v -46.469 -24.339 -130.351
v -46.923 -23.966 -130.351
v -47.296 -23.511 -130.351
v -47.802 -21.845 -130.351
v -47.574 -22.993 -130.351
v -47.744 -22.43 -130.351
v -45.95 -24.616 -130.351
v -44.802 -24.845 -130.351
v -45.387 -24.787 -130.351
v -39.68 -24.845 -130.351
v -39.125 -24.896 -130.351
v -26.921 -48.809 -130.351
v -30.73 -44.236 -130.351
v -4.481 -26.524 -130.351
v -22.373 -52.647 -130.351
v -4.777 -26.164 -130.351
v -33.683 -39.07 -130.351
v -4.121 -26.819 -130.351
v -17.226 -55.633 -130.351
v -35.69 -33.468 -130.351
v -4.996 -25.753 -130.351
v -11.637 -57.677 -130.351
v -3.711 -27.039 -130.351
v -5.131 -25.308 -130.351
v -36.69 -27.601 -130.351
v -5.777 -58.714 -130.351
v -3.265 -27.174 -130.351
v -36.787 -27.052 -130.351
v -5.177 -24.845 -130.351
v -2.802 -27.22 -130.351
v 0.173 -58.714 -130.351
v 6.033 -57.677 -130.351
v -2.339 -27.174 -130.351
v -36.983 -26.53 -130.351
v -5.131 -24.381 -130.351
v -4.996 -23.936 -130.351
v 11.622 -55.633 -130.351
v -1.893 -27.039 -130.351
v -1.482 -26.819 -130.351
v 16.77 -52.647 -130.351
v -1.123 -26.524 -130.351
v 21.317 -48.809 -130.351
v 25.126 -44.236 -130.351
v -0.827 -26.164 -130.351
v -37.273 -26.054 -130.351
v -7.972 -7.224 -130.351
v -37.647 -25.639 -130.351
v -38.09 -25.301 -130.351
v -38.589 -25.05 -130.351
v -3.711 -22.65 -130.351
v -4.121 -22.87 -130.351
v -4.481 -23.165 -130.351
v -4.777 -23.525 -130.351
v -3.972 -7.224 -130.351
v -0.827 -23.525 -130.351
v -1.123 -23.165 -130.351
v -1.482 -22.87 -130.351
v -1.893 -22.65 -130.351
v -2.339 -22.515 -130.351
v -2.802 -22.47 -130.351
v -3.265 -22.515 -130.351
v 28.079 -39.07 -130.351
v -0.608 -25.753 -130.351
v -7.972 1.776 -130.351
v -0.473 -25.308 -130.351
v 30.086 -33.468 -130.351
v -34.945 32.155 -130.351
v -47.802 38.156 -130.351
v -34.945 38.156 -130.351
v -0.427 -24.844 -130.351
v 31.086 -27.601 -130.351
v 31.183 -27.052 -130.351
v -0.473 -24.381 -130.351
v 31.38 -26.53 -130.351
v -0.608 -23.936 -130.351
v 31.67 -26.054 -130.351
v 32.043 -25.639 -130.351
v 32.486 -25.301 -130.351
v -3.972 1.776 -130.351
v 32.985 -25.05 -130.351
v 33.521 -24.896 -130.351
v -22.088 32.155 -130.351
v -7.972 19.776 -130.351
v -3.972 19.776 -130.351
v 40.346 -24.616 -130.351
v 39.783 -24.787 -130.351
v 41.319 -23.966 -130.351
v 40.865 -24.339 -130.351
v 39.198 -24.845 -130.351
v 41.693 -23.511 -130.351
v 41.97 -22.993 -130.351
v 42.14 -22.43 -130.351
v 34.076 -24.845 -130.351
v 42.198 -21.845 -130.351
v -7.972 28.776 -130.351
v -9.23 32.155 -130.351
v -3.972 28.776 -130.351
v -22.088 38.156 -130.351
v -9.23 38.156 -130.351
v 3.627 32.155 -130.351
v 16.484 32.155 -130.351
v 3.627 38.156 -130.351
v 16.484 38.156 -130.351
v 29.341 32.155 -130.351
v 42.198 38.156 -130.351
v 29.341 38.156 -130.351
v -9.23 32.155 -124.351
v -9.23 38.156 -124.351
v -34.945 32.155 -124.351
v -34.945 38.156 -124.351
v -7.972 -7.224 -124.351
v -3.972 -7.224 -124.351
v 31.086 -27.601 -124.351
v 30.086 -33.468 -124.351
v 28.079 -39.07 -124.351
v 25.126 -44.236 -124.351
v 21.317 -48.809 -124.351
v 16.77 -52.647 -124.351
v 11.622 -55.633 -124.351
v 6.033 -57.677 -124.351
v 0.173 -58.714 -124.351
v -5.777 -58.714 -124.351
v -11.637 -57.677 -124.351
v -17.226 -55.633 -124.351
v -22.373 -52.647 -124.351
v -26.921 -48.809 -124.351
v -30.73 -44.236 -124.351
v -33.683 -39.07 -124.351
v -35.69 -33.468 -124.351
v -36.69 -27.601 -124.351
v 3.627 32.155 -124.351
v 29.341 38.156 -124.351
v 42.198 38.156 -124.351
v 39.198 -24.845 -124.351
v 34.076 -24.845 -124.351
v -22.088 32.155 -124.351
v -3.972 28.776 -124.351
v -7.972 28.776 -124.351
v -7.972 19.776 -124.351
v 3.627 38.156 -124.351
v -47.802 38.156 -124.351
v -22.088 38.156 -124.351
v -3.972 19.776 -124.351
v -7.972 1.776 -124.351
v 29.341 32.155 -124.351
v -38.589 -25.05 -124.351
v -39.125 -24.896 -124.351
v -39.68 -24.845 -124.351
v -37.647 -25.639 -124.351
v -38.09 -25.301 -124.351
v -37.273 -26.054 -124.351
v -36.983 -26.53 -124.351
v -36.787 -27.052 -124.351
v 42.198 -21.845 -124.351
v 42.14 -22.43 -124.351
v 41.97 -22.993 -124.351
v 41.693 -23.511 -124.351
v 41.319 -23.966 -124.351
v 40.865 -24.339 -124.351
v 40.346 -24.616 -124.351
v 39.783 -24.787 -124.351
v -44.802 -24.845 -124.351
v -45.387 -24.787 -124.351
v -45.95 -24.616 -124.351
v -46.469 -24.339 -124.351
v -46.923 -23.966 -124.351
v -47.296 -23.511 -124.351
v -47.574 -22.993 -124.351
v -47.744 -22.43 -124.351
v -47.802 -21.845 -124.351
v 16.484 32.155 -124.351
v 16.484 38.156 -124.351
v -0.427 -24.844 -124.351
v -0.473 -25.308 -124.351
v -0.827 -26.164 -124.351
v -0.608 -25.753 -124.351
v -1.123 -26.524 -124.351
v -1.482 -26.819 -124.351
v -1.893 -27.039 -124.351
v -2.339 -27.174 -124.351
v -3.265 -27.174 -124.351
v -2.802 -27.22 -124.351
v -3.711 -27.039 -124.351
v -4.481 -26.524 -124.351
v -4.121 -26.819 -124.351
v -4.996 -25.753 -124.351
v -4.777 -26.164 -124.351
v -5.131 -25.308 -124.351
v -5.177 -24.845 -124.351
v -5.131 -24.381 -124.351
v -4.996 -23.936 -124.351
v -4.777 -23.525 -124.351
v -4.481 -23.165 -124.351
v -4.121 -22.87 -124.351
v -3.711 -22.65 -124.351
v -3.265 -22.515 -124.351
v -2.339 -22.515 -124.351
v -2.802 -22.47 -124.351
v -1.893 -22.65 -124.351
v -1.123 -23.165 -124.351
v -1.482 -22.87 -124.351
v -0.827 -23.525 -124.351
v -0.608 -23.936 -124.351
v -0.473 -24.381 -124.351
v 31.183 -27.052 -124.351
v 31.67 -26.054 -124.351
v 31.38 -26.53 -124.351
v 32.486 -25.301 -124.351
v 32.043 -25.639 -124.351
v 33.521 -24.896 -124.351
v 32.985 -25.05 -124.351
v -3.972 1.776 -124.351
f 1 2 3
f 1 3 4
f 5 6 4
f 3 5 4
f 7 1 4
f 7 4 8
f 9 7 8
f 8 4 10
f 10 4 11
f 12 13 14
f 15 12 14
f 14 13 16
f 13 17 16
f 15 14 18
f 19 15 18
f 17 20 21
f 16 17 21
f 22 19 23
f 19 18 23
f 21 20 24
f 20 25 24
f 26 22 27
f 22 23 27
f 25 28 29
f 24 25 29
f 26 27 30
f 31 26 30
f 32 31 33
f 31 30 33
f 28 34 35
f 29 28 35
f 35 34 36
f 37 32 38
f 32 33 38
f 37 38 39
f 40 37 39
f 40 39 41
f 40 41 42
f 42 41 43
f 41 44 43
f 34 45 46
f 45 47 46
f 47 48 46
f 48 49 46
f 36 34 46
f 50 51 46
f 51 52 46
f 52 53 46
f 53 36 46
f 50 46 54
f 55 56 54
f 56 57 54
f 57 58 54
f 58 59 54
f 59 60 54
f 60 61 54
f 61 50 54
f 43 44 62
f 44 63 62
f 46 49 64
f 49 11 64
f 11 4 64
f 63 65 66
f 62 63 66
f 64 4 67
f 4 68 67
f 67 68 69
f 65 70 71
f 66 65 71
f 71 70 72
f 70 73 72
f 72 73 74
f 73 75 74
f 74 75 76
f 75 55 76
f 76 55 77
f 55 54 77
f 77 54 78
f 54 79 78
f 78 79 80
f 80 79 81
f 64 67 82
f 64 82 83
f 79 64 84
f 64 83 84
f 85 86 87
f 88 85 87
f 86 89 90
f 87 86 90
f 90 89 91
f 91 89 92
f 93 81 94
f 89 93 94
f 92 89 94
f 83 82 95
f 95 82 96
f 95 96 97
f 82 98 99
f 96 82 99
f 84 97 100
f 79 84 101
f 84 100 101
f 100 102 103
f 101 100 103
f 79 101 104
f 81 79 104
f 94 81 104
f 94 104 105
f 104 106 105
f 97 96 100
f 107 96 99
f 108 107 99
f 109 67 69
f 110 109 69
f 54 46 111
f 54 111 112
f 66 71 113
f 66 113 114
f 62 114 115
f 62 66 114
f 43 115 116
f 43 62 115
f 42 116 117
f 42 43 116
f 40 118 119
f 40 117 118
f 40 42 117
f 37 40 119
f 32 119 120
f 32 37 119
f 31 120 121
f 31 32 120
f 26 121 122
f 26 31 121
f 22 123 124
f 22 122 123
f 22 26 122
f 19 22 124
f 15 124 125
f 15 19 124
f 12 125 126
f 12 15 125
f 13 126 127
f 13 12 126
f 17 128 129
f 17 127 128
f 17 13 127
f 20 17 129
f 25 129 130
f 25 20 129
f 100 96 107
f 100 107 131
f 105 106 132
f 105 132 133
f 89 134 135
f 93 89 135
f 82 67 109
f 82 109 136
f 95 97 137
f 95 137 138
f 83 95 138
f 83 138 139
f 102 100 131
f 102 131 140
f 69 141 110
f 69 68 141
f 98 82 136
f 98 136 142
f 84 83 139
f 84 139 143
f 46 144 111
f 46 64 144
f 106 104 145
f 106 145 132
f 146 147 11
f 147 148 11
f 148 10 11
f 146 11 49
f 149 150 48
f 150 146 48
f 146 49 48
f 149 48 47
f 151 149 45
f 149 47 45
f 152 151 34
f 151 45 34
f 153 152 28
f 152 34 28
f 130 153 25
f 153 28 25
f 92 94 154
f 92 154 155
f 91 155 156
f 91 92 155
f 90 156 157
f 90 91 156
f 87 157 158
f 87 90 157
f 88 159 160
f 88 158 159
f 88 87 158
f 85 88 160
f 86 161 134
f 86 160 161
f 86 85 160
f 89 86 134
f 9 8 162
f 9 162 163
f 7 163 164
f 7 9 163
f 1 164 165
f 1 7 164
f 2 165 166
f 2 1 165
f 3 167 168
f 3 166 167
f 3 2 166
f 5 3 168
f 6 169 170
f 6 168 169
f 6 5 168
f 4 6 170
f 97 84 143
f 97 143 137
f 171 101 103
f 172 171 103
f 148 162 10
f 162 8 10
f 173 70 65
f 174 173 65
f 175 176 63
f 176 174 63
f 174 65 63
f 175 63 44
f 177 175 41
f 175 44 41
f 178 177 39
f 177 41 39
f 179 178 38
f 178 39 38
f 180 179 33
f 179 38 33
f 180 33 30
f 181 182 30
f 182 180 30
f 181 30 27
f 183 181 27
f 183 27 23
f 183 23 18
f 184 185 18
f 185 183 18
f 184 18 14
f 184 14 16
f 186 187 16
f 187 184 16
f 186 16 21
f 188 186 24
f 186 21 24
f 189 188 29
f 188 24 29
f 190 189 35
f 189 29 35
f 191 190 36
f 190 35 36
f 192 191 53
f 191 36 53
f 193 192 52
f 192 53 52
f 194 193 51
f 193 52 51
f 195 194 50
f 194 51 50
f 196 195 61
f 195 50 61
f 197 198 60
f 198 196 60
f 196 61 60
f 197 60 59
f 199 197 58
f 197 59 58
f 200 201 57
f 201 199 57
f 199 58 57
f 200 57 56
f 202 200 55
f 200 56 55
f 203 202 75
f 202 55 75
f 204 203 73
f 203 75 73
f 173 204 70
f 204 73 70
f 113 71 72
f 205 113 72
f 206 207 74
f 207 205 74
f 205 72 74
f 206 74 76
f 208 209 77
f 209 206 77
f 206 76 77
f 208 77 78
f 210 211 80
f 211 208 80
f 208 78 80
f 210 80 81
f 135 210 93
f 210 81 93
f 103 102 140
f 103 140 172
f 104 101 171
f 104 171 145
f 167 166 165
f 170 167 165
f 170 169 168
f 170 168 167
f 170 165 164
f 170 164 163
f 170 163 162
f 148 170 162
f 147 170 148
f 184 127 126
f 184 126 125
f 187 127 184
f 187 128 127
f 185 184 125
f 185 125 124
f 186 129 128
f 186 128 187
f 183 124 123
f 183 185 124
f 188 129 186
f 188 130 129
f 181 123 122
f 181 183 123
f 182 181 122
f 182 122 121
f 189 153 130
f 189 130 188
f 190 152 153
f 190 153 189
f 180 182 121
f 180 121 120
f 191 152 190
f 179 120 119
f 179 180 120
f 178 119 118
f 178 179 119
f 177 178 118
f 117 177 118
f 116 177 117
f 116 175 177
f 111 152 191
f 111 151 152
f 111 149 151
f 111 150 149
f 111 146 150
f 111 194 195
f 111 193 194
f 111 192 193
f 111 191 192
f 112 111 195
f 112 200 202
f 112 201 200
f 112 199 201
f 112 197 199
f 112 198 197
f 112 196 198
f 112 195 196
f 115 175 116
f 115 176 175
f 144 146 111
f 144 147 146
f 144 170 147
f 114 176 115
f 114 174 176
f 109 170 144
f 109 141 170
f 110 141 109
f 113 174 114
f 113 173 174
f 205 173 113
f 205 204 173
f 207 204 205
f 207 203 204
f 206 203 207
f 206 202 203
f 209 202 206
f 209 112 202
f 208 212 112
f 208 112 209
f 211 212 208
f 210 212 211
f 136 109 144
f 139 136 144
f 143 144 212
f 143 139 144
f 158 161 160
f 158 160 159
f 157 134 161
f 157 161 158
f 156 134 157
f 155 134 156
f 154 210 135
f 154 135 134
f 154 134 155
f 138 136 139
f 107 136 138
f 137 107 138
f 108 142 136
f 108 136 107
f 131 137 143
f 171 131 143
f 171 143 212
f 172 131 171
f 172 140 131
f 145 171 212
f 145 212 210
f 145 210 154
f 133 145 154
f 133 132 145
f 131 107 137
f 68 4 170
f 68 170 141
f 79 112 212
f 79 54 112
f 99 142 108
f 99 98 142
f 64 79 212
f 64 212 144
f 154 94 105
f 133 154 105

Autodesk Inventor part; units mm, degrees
ref_plane "YZ Plane" through (0, 0, 0) normal (1, 0, 0) x (0, 1, 0)
ref_plane "XZ Plane" through (0, 0, 0) normal (0, 1, 0) x (-1, 0, 0)
ref_plane "РабПлоскость1" through (-34.9448, 28.465, -130.3508) normal (0, 0, 1) x (1, 0, 0)
sketch "Эскиз1" plane through (-34.9448, 28.465, -130.3508) normal (0, 0, 1) x (1, 0, 0)
  line L0 (0, 3.6904) -> (-12.8571, 3.6904) construction
  line L1 (0, 3.6904) -> (0, 9.6905) projected
  line L2 (-12.8571, 9.6905) -> (0, 9.6905) projected
  line L3 (-12.8571, 3.6904) -> (-12.8571, 9.6905)
  line L4 (25.7143, 3.6904) -> (12.8571, 3.6904) construction
  line L5 (25.7143, 3.6904) -> (25.7143, 9.6905) projected
  line L6 (12.8571, 9.6905) -> (25.7143, 9.6905) projected
  line L7 (12.8571, 3.6904) -> (12.8571, 9.6905)
  line L8 (51.4286, 3.6904) -> (38.5714, 3.6904) construction
  line L9 (51.4286, 3.6904) -> (51.4286, 9.6905) projected
  line L10 (38.5714, 9.6905) -> (51.4286, 9.6905) projected
  line L11 (38.5714, 3.6904) -> (38.5714, 9.6905)
  line L12 (77.1429, 3.6904) -> (64.2857, 3.6904) construction
  line L13 (77.1429, 3.6904) -> (77.1429, 9.6905) projected
  line L14 (64.2857, 9.6905) -> (77.1429, 9.6905) projected
  line L15 (64.2857, 3.6904) -> (64.2857, 9.6905)
  line L16 (0, 3.6904) -> (12.8571, 3.6904)
  line L17 (25.7143, 3.6904) -> (38.5714, 3.6904)
  line L18 (51.4286, 3.6904) -> (64.2857, 3.6904)
  line L19 (-12.8571, 3.6904) -> (-12.8571, -50.3096)
  line L20 (-9.8571, -53.3096) -> (-4.7353, -53.3096)
  line L21 (77.1429, 3.6904) -> (77.1429, -50.3096)
  line L22 (74.1429, -53.3096) -> (69.021, -53.3096)
  line L23 (-1.8571, -53.3096) -> (66.1429, -53.3096) construction
  arc A0 (-1.7452, -56.0663) -> (66.0309, -56.0663) centre (32.1429, -53.3096) ccw
  arc A1 (-1.7452, -56.0663) -> (-4.7353, -53.3096) centre (-4.7353, -56.3096) ccw
  arc A2 (69.021, -53.3096) -> (66.0309, -56.0663) centre (69.021, -56.3096) ccw
  arc A3 (74.1429, -53.3096) -> (77.1429, -50.3096) centre (74.1429, -50.3096) ccw
  arc A4 (-12.8571, -50.3096) -> (-9.8571, -53.3096) centre (-9.8571, -50.3096) ccw
  circle A5 centre (32.1429, -53.3095) radius 2.375
  point P0 (34.9448, -28.465)
  point P1 (77.1429, -53.3096)
  dimension "d0" = 57
  dimension "d1" = 34
  dimension "d2" = 3
  dimension "d3" = 6
  dimension "d14" = 4.75
ref_plane "РабПлоскость2" through (-162.802, 331.465, 111.3492) normal (0, 0, 1) x (1, 0, 0)
extrude "Выдавливание1" add sketch "Эскиз1" along normal blind 6
sketch "Эскиз6" plane through (-34.9448, 28.465, -130.3508) normal (0, 0, -1) x (-1, 0, 0)
  line L0 (-30.9731, -35.6894) -> (-30.9731, -26.6894)
  line L1 (-30.9731, -26.6894) -> (-26.9731, -26.6894)
  line L2 (-26.9731, -35.6894) -> (-30.9731, -35.6894)
  line L3 (-26.9731, -26.6894) -> (-26.9731, -35.6894)
  line L4 (-26.9731, 0.3106) -> (-26.9731, -8.6894)
  line L5 (-26.9731, -8.6894) -> (-30.9731, -8.6894)
  line L6 (-30.9731, 0.3106) -> (-26.9731, 0.3106)
  line L7 (-30.9731, -8.6894) -> (-30.9731, 0.3106)
extrude "Выдавливание5" cut sketch "Эскиз6" against normal blind 10
sketch "Эскиз2" plane through (-34.9448, 28.465, -130.3508) normal (0, 0, -1) x (-1, 0, 0)
  line L0 (-4.9286, 3.6904) -> (-4.9286, -2.6596)
  line L1 (-4.9286, -2.6596) -> (-3.6786, -2.6596)
  line L2 (-3.6786, -2.6596) -> (-3.6786, -4.9596)
  line L3 (-3.6786, -4.9596) -> (-4.9286, -4.9596)
  line L4 (-4.9286, -4.9596) -> (-4.9286, -11.3096)
  line L5 (-4.9286, -11.3096) -> (-7.9286, -11.3096)
  line L6 (-7.9286, -11.3096) -> (-7.9286, -4.9596)
  line L7 (-7.9286, -4.9596) -> (-9.1786, -4.9596)
  line L8 (-9.1786, -4.9596) -> (-9.1786, -2.6596)
  line L9 (-9.1786, -2.6596) -> (-7.9286, -2.6596)
  line L10 (-7.9286, -2.6596) -> (-7.9286, 3.6904)
  line L11 (-56.3571, 3.6904) -> (-59.3571, 3.6904)
  line L12 (-56.3571, 3.6904) -> (-56.3571, -2.6596)
  line L13 (-56.3571, -2.6596) -> (-55.1071, -2.6596)
  line L14 (-55.1071, -2.6596) -> (-55.1071, -4.9596)
  line L15 (-55.1071, -4.9596) -> (-56.3571, -4.9596)
  line L16 (-56.3571, -4.9596) -> (-56.3571, -11.3096)
  line L17 (-56.3571, -11.3096) -> (-59.3571, -11.3096)
  line L18 (-59.3571, -11.3096) -> (-59.3571, -4.9596)
  line L19 (-59.3571, -4.9596) -> (-60.6071, -4.9596)
  line L20 (-60.6071, -4.9596) -> (-60.6071, -2.6596)
  line L21 (-60.6071, -2.6596) -> (-59.3571, -2.6596)
  line L22 (-59.3571, -2.6596) -> (-59.3571, 3.6904)
  line L23 (-56.3571, 3.6904) -> (-59.3571, 3.6904) projected
  line L24 (-4.9286, 3.6904) -> (-7.9286, 3.6904) projected
  line L25 (-25.7143, 3.6904) -> (-25.7143, 9.6905) projected
  line L26 (-38.5714, 3.6904) -> (-25.7143, 3.6904) projected
  line L27 (-38.5714, 9.6905) -> (-38.5714, 3.6904) projected
  line L28 (-51.4286, 3.6904) -> (-51.4286, 9.6905) projected
  line L29 (-64.2857, 3.6904) -> (-51.4286, 3.6904) projected
  line L30 (-64.2857, 9.6905) -> (-64.2857, 3.6904) projected
  line L31 (-77.1429, -50.3096) -> (-77.1429, 9.6905) projected
  arc A0 (-77.1429, -50.3096) -> (-74.1429, -53.3096) centre (-74.1429, -50.3096) ccw projected
  line L32 (-69.021, -53.3096) -> (-74.1429, -53.3096) projected
  arc A1 (-66.0309, -56.0663) -> (-69.021, -53.3096) centre (-69.021, -56.3096) ccw projected
  arc A2 (-66.0309, -56.0663) -> (1.7452, -56.0663) centre (-32.1429, -53.3096) ccw projected
  arc A3 (4.7353, -53.3096) -> (1.7452, -56.0663) centre (4.7353, -56.3096) ccw projected
  line L33 (9.8571, -53.3096) -> (4.7353, -53.3096) projected
  arc A4 (9.8571, -53.3096) -> (12.8571, -50.3096) centre (9.8571, -50.3096) ccw projected
  line L34 (12.8571, 9.6905) -> (12.8571, -50.3096) projected
  line L35 (0, 3.6904) -> (0, 9.6905) projected
  line L36 (-12.8571, 3.6904) -> (0, 3.6904) projected
  line L37 (-12.8571, 9.6905) -> (-12.8571, 3.6904) projected
  circle A5 centre (-32.1429, -53.3095) radius 2.375 projected
  line L38 (-25.7143, 9.6905) -> (-12.8571, 9.6905) projected
  line L39 (-51.4286, 9.6905) -> (-38.5714, 9.6905) projected
  line L40 (-77.1429, 9.6905) -> (-64.2857, 9.6905) projected
  line L41 (0, 9.6905) -> (12.8571, 9.6905) projected
  point P0 (-6.4286, 0)
sketch "Эскиз4" plane through (29.3409, 38.1554, -130.3508) normal (0, 1, 0) x (1, 0, 0)
  line L0 (-77.1429, 0) -> (-77.1429, -6) projected
  line L1 (12.8571, 0) -> (-77.1429, 0)
  line L2 (-77.1429, 0) -> (-77.1429, -6)
  line L3 (-77.1429, -6) -> (12.8571, -6)
  line L4 (12.8571, -6) -> (12.8571, 0)
  point P0 (-29.3409, -130.3508)
sketch "Эскиз5" plane through (-34.9448, 28.465, -130.3508) normal (0, 0, -1) x (-1, 0, 0)
  line L0 (-236.4804, 8.6905) -> (-77.1429, 8.6905) construction
  line L1 (-77.1429, 8.6905) -> (-64.2857, 8.6905) construction
  line L2 (-64.2857, 8.6905) -> (-51.4286, 8.6905) construction
  line L3 (-51.4286, 8.6905) -> (-38.5714, 8.6905) construction
  line L4 (-38.5714, 8.6905) -> (-25.7143, 8.6905) construction
  line L5 (-25.7143, 8.6905) -> (-12.8571, 8.6905) construction
  line L6 (-12.8571, 8.6905) -> (0, 8.6905) construction
  line L7 (0, 8.6905) -> (12.8571, 8.6905) construction
  line L8 (12.8571, 8.6905) -> (44.8254, 8.6905) construction
  line L9 (44.8254, 8.6905) -> (44.8254, 3.6905) construction
  line L10 (44.8254, 3.6905) -> (12.8571, 3.6905) construction
  line L11 (12.8571, 3.6905) -> (12.8571, 8.6905) construction
  line L12 (-236.4804, 3.6905) -> (-236.4804, 8.6905) construction
  line L13 (-77.1429, 3.6905) -> (-236.4804, 3.6905) construction
  line L14 (-64.2857, 3.6905) -> (-77.1429, 3.6905) construction
  line L15 (-51.4286, 3.6905) -> (-64.2857, 3.6905) construction
  line L16 (-38.5714, 3.6905) -> (-51.4286, 3.6905) construction
  line L17 (-25.7143, 3.6905) -> (-38.5714, 3.6905) construction
  line L18 (-12.8571, 3.6905) -> (-25.7143, 3.6905) construction
  line L19 (0, 3.6905) -> (-12.8571, 3.6905) construction
  line L20 (12.8571, 3.6905) -> (0, 3.6905) construction
  line L21 (-77.1429, 8.6905) -> (-77.1429, 3.6905) construction
  line L22 (-64.2857, 3.6905) -> (-64.2857, 8.6905) construction
  line L23 (-51.4286, 8.6905) -> (-51.4286, 3.6905) construction
  line L24 (-38.5714, 3.6905) -> (-38.5714, 8.6905) construction
  line L25 (-25.7143, 8.6905) -> (-25.7143, 3.6905) construction
  line L26 (-12.8571, 3.6905) -> (-12.8571, 8.6905) construction
  line L27 (0, 8.6905) -> (0, 3.6905) construction
  line L28 (-242.4804, 3.6905) -> (-352.8338, 3.6905) construction
  line L29 (-352.8338, 3.6905) -> (-352.8338, 8.6905) construction
  line L30 (-352.8338, 8.6905) -> (-242.4804, 8.6905) construction
  line L31 (-242.4804, 8.6905) -> (-242.4804, 3.6905) construction
  line L32 (-34.1429, 3.6915) -> (-30.1429, 3.6915) construction
  line L33 (-30.1429, -50.9345) -> (-34.1429, -50.9345) construction
  line L34 (-34.1429, 3.6915) -> (-30.1429, -50.9345) construction
  line L35 (-30.1429, 3.6915) -> (-34.1429, -50.9345) construction
  circle A0 centre (-32.1429, -53.3095) radius 2.375 construction
  line L36 (-34.1429, -5.6215) -> (-30.1429, -5.6215)
  line L37 (-30.1429, -41.6215) -> (-34.1429, -41.6215)
  line L38 (-34.1429, -5.6215) -> (-30.1429, -41.6215) construction
  line L39 (-30.1429, -5.6215) -> (-34.1429, -41.6215) construction
  line L40 (-34.1429, -14.6215) -> (-30.1429, -14.6215)
  line L41 (-30.1429, -32.6215) -> (-34.1429, -32.6215)
  line L42 (-34.1429, -14.6215) -> (-30.1429, -32.6215) construction
  line L43 (-30.1429, -14.6215) -> (-34.1429, -32.6215) construction
  line L44 (-34.1429, -41.6215) -> (-34.1429, -32.6215)
  line L45 (-34.1429, -14.6215) -> (-34.1429, -5.6215)
  line L46 (-30.1429, -5.6215) -> (-30.1429, -14.6215)
  line L47 (-30.1429, -32.6215) -> (-30.1429, -41.6215)
  line L48 (-30.1429, -32.6215) -> (-30.1429, -41.6215) construction
  line L49 (-34.1429, -50.9345) -> (-34.1429, -32.6215) construction
  line L50 (-34.1429, -14.6215) -> (-34.1429, 3.6915) construction
  line L51 (-30.1429, 3.6915) -> (-30.1429, 3.6905) construction
  line L52 (-30.1429, -5.6215) -> (-30.1429, -14.6215) construction
  point P0 (-34.9448, -28.465)
  point P1 (-32.1429, -23.6215)
  point P2 (-32.1429, -50.9345)
  dimension "d20" = 4
  dimension "d21" = 54.626
equation "\"d4\" = d3"
properties part number "wheel1"
